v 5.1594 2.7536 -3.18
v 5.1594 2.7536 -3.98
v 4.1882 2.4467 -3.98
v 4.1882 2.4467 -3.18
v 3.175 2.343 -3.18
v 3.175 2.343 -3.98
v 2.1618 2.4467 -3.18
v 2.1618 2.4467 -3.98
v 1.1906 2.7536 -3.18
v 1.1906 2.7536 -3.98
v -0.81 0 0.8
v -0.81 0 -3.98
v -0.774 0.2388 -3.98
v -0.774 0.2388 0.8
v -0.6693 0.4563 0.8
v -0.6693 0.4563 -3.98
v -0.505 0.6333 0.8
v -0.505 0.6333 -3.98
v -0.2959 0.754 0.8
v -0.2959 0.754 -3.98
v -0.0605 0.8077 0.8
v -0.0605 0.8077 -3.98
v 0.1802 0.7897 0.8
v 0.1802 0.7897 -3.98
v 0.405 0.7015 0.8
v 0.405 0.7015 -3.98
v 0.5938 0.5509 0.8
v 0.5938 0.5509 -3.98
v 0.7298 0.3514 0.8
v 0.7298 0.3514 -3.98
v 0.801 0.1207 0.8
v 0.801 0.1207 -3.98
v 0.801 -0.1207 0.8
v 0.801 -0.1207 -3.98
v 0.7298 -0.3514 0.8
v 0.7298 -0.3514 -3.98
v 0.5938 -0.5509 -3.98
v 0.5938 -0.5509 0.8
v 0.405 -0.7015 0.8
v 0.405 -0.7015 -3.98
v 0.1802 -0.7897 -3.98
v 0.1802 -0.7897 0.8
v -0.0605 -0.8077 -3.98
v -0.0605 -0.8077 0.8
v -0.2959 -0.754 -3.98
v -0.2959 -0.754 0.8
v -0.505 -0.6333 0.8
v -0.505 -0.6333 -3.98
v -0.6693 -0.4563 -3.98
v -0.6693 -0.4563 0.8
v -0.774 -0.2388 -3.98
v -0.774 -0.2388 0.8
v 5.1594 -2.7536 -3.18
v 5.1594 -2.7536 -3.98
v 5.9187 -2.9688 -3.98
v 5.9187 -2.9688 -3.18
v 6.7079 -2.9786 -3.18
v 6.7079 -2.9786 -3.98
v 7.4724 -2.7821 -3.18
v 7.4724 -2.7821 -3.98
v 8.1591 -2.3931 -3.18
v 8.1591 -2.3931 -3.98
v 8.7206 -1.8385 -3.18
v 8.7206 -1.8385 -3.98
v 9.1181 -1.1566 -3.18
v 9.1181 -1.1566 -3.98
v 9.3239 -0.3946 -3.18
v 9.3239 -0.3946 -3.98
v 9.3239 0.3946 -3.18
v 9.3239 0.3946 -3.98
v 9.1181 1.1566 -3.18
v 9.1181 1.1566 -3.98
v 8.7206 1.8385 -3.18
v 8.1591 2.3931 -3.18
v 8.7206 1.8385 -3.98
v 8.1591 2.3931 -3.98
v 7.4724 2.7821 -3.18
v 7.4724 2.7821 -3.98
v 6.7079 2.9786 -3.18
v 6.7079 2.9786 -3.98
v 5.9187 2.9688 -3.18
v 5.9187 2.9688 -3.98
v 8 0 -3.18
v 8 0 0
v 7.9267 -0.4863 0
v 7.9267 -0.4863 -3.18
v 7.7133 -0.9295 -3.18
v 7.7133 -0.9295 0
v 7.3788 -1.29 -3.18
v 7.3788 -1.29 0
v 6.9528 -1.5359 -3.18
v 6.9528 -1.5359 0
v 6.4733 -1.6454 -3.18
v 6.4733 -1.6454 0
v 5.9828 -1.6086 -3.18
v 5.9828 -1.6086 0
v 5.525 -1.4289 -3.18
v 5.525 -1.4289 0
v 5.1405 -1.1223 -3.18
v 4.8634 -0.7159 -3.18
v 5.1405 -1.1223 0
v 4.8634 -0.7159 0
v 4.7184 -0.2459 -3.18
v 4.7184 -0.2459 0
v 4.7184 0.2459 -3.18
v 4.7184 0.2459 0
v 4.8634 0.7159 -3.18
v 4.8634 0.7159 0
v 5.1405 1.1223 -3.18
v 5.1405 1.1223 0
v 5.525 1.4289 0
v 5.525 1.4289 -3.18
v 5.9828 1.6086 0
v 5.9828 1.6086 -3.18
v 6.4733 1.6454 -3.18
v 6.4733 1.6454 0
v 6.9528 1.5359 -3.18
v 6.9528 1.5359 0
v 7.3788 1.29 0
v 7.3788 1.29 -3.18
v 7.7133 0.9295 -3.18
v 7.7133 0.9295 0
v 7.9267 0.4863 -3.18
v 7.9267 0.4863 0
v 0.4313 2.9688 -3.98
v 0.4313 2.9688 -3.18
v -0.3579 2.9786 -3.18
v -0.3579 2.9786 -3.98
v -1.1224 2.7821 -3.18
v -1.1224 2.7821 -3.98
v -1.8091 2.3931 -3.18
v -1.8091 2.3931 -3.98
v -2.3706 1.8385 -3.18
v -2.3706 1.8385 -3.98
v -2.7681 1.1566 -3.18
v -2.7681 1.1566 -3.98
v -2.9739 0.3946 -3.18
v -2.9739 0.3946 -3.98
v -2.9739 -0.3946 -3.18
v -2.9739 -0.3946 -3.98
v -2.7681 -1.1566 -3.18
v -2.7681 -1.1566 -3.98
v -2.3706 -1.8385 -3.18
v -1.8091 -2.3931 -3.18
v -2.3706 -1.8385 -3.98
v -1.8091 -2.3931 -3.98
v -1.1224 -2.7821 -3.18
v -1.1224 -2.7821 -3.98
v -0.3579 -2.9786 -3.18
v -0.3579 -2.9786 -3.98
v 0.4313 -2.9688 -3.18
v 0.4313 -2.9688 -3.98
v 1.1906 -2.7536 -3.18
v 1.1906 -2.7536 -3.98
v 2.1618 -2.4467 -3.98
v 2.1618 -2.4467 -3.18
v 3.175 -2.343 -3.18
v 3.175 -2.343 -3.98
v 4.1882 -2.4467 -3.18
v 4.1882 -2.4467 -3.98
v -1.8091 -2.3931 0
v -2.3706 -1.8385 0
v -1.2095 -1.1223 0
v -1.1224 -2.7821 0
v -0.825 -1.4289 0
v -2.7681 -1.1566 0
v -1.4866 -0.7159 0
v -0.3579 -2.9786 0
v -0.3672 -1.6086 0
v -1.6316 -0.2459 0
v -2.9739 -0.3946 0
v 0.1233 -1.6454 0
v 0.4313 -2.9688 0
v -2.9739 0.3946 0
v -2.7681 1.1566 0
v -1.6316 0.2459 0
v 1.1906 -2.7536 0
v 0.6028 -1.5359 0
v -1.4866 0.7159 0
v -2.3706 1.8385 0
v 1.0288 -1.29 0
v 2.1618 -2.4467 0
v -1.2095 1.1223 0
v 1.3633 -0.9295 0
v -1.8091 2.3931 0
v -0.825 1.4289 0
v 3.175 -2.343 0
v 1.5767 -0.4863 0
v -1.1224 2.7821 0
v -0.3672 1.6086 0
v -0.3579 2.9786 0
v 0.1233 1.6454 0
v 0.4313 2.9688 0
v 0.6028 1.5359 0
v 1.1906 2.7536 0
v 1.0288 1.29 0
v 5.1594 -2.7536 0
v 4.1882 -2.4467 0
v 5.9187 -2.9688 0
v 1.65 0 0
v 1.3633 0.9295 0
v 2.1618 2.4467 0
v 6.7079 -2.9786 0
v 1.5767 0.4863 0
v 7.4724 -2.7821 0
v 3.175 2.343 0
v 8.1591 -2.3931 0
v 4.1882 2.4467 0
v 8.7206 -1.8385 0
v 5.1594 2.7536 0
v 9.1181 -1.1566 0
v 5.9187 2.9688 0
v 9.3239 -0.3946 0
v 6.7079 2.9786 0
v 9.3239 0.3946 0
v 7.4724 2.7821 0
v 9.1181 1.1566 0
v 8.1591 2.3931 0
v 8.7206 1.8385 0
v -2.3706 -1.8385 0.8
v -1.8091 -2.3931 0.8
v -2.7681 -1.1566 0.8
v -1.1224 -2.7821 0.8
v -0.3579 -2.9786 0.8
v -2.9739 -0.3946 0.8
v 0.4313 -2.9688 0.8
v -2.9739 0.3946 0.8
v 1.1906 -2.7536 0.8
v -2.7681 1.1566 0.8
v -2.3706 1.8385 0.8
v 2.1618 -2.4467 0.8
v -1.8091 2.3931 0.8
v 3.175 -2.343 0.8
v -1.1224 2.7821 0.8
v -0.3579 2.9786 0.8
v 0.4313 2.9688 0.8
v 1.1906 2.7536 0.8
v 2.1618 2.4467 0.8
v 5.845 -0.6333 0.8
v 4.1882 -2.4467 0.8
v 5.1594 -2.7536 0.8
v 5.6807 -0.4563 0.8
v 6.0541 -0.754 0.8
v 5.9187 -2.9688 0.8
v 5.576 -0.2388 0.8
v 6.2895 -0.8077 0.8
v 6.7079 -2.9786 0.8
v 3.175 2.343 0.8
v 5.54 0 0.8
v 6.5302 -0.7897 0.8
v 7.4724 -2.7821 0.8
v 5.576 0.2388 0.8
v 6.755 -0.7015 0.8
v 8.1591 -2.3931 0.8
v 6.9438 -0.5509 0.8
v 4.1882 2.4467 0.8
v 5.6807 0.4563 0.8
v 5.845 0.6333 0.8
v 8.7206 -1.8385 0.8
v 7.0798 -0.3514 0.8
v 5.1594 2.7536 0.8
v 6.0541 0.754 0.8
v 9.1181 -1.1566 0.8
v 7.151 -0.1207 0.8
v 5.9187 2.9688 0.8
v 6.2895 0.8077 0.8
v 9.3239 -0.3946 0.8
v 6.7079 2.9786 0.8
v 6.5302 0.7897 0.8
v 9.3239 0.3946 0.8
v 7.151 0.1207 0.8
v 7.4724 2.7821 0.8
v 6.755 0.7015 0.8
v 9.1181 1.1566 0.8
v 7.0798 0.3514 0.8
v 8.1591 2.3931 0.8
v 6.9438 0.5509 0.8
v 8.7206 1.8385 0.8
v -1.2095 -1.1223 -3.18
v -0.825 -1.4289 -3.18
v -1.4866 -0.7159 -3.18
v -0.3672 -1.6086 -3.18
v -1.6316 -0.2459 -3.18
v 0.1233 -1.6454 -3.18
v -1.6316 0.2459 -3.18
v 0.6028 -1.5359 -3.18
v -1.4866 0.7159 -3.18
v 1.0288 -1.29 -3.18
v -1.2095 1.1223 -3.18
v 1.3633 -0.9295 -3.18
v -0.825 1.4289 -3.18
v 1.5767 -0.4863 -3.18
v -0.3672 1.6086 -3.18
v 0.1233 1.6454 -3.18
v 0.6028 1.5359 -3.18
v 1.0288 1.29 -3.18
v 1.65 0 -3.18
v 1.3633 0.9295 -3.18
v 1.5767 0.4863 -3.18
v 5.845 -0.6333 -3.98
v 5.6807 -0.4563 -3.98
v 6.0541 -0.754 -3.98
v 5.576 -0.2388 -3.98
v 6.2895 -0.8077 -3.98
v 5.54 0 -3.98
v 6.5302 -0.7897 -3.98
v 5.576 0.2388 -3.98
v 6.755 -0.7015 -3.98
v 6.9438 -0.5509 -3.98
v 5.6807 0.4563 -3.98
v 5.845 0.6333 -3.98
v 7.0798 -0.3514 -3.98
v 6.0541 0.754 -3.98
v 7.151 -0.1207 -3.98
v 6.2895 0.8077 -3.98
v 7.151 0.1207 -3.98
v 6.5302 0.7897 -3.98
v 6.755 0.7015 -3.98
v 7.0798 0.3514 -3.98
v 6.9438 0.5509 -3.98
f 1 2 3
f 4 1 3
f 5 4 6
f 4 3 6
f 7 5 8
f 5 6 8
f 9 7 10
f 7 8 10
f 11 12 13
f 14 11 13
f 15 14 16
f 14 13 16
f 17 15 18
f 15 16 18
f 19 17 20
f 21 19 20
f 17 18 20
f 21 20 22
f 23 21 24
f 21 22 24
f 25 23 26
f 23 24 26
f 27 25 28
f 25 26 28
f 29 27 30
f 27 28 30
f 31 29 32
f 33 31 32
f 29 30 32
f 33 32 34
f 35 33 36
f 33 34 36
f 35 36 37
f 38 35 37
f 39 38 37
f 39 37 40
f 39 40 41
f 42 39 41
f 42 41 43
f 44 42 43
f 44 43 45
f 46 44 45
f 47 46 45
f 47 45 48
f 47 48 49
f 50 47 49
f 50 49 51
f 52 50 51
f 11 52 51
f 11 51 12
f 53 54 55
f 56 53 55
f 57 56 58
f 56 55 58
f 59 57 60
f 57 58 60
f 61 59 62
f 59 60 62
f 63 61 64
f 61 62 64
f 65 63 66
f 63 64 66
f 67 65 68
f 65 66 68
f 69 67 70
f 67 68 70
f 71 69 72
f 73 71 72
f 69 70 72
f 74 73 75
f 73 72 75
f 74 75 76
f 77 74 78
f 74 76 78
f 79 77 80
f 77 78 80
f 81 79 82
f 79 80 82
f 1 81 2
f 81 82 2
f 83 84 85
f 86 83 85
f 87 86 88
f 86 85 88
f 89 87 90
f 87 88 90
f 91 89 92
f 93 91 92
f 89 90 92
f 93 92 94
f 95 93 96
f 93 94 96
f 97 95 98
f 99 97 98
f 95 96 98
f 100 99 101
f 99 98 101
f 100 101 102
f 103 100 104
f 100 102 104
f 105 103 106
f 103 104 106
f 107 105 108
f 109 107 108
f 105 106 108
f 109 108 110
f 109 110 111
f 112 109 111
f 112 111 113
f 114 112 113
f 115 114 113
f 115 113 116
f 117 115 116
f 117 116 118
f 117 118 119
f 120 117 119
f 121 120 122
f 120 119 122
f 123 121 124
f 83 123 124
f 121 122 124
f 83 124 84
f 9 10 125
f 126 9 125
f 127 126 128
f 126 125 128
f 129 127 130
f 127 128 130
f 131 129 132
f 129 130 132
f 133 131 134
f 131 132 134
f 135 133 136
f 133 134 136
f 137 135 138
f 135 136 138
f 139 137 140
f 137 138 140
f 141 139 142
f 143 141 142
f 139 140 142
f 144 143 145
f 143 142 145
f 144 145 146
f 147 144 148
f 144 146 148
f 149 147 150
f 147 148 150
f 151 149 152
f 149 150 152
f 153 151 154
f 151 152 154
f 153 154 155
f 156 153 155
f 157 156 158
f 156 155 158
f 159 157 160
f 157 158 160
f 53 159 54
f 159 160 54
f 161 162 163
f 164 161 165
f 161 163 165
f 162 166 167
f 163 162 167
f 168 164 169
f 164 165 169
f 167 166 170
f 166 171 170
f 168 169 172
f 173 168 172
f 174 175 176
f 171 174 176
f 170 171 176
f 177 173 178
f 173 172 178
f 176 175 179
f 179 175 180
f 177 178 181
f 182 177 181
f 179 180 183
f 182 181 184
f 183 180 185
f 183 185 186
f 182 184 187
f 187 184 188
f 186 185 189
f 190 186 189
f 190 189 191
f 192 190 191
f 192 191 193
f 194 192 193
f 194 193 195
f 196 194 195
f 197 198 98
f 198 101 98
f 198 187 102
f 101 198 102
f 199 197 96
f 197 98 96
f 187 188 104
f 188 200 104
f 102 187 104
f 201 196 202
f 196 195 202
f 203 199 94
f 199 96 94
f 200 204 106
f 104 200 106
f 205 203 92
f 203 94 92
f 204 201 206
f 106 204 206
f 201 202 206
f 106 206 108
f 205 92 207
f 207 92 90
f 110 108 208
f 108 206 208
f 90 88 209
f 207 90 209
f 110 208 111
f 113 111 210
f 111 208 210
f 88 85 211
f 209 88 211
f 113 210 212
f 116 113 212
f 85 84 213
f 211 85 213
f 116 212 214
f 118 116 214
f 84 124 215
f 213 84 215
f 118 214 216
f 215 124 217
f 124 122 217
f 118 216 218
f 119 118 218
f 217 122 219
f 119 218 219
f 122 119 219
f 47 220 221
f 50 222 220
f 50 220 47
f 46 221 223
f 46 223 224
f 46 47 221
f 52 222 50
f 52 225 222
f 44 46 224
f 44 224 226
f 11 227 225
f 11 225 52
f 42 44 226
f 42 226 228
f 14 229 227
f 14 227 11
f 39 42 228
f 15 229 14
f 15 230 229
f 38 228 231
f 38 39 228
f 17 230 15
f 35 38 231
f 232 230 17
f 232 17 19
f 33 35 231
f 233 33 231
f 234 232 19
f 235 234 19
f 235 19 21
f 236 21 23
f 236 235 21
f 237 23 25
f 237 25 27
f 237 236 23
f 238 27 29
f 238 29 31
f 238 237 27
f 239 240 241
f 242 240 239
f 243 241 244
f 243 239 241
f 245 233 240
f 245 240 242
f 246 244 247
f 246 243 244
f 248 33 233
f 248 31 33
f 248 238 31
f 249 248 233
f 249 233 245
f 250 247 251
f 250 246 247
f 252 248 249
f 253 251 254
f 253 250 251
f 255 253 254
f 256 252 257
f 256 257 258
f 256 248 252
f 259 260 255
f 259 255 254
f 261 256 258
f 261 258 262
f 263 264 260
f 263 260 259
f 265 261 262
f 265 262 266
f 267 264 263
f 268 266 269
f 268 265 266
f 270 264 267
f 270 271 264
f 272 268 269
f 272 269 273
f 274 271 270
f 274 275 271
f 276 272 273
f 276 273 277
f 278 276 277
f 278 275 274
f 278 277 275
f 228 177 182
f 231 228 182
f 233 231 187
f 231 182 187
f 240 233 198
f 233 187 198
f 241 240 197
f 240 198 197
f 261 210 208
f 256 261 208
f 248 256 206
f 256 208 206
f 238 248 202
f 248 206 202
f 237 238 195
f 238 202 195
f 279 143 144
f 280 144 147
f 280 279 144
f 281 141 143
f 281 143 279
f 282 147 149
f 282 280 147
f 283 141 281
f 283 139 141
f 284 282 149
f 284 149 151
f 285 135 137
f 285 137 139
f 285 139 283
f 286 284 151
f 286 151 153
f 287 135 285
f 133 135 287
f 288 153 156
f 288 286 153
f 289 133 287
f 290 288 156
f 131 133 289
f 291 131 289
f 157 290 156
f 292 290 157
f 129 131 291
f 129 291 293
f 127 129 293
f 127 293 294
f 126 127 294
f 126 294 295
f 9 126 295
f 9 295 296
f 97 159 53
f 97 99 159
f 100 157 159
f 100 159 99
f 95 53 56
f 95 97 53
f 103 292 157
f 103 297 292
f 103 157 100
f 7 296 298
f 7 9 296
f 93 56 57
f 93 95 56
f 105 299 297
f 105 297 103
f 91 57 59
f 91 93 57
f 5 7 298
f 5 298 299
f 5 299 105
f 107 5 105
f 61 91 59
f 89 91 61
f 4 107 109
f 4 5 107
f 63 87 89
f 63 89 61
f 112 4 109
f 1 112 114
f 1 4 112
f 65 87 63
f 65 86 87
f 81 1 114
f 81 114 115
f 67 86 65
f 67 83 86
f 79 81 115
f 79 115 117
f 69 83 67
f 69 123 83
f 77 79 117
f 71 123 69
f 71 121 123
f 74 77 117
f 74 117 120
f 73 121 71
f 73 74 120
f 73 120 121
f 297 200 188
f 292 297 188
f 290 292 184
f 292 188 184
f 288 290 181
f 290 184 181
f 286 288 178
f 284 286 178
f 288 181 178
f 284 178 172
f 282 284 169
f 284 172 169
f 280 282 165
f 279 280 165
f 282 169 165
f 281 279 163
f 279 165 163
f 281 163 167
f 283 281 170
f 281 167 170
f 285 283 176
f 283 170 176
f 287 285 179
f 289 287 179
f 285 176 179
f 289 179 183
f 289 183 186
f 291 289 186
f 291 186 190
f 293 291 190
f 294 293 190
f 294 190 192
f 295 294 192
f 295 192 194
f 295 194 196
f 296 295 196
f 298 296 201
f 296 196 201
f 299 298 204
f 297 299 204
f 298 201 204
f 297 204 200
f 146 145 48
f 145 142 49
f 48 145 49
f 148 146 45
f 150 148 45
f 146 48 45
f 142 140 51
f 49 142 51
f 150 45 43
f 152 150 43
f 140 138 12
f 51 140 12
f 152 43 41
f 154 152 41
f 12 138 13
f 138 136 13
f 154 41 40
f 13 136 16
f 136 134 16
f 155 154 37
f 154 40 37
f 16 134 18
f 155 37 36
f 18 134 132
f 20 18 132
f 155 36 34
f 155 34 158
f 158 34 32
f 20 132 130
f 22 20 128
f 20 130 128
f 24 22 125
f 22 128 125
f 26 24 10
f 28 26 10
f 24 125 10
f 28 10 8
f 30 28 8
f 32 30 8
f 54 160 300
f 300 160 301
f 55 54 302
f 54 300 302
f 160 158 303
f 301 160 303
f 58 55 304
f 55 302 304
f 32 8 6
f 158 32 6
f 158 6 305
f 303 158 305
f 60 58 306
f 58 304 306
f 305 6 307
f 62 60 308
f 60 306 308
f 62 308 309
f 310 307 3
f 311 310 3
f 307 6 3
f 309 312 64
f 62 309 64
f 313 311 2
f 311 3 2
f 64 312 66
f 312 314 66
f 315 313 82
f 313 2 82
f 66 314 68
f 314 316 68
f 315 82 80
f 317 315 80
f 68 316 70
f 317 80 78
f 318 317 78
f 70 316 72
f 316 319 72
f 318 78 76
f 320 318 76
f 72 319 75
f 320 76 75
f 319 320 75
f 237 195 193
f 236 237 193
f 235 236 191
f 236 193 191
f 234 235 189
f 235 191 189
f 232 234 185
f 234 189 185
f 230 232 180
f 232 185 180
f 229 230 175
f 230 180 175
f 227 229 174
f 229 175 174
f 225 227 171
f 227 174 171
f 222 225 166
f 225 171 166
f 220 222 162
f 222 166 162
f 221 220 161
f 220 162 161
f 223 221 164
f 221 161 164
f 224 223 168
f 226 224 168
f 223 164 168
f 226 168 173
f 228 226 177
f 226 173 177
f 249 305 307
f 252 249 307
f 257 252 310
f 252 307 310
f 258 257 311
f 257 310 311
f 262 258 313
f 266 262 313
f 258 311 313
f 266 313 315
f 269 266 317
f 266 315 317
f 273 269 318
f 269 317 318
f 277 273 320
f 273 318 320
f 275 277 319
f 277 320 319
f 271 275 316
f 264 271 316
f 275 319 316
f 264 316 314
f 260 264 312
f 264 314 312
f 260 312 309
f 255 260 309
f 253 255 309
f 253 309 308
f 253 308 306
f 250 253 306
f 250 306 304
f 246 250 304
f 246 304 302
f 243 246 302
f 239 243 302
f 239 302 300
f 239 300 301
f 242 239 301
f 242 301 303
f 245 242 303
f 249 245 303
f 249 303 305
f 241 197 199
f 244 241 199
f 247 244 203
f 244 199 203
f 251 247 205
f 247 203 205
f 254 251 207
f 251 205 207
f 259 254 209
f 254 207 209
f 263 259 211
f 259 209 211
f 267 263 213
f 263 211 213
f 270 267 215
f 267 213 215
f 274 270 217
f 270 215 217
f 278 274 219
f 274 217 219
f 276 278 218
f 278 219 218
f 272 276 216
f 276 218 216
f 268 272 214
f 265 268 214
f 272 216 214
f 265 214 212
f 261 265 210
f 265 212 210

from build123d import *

# Parameters (mm, degrees)
EXTRUDE_1_DEPTH     = 0.8
SKETCH_2_R          = 1.65
EXTRUDE_2_DEPTH     = 3.18
EXTRUDE_START       = 0.8
EXTRUDE_3_DEPTH     = 0.8
SKETCH_5_R          = 0.81
CUT_EXTRUDE_1_DEPTH = 4.8


with BuildPart() as part:
    # 草图1 → 凸台-拉伸1 (new body)
    with BuildSketch(Plane.XY):
        with BuildLine():
            ThreePointArc((1.190625, 2.753618004), (-3, 0), (1.190625, -2.753618004))
            ThreePointArc((1.190625, -2.753618004), (3.175, -2.342981343), (5.159375, -2.753618004))
            ThreePointArc((5.159375, -2.753618004), (9.35, 0), (5.159375, 2.753618004))
            ThreePointArc((5.159375, 2.753618004), (3.175, 2.342981343), (1.190625, 2.753618004))
        make_face()
    extrude(amount=EXTRUDE_1_DEPTH)

    # 草图2 → 凸台-拉伸2 (add)
    with BuildSketch(Plane(origin=(0, 0, 0), x_dir=(-1, 0, 0), z_dir=(0, 0, -1))):
        with Locations(Location((-6.35, 0, 0), (0, 0, 180))):
            Circle(SKETCH_2_R)
        with Locations(Location((0, 0, 0), (0, 0, 180))):
            Circle(SKETCH_2_R)
    extrude(amount=EXTRUDE_2_DEPTH)

    # 草图3 → 凸台-拉伸3 (add)
    with BuildSketch(Plane(origin=(0, 0, -3.18), x_dir=(-1, 0, 0), z_dir=(0, 0, -1)).offset(EXTRUDE_START)):
        with BuildLine():
            ThreePointArc((-1.190625, -2.753618004), (-3.175, -2.342981343), (-5.159375, -2.753618004))
            ThreePointArc((-5.159375, -2.753618004), (-9.35, 0), (-5.159375, 2.753618004))
            ThreePointArc((-5.159375, 2.753618004), (-3.175, 2.342981343), (-1.190625, 2.753618004))
            ThreePointArc((-1.190625, 2.753618004), (3, 0), (-1.190625, -2.753618004))
        make_face()
    extrude(amount=-EXTRUDE_3_DEPTH)

    # 草图5 → 切除-拉伸1 (cut)
    with BuildSketch(Plane(origin=(0, 0, -3.98), x_dir=(-1, 0, 0), z_dir=(0, 0, -1))):
        with Locations((-6.35, 0)):
            Circle(SKETCH_5_R)
        Circle(SKETCH_5_R)
    extrude(amount=-CUT_EXTRUDE_1_DEPTH, mode=Mode.SUBTRACT)


solid = part.part
